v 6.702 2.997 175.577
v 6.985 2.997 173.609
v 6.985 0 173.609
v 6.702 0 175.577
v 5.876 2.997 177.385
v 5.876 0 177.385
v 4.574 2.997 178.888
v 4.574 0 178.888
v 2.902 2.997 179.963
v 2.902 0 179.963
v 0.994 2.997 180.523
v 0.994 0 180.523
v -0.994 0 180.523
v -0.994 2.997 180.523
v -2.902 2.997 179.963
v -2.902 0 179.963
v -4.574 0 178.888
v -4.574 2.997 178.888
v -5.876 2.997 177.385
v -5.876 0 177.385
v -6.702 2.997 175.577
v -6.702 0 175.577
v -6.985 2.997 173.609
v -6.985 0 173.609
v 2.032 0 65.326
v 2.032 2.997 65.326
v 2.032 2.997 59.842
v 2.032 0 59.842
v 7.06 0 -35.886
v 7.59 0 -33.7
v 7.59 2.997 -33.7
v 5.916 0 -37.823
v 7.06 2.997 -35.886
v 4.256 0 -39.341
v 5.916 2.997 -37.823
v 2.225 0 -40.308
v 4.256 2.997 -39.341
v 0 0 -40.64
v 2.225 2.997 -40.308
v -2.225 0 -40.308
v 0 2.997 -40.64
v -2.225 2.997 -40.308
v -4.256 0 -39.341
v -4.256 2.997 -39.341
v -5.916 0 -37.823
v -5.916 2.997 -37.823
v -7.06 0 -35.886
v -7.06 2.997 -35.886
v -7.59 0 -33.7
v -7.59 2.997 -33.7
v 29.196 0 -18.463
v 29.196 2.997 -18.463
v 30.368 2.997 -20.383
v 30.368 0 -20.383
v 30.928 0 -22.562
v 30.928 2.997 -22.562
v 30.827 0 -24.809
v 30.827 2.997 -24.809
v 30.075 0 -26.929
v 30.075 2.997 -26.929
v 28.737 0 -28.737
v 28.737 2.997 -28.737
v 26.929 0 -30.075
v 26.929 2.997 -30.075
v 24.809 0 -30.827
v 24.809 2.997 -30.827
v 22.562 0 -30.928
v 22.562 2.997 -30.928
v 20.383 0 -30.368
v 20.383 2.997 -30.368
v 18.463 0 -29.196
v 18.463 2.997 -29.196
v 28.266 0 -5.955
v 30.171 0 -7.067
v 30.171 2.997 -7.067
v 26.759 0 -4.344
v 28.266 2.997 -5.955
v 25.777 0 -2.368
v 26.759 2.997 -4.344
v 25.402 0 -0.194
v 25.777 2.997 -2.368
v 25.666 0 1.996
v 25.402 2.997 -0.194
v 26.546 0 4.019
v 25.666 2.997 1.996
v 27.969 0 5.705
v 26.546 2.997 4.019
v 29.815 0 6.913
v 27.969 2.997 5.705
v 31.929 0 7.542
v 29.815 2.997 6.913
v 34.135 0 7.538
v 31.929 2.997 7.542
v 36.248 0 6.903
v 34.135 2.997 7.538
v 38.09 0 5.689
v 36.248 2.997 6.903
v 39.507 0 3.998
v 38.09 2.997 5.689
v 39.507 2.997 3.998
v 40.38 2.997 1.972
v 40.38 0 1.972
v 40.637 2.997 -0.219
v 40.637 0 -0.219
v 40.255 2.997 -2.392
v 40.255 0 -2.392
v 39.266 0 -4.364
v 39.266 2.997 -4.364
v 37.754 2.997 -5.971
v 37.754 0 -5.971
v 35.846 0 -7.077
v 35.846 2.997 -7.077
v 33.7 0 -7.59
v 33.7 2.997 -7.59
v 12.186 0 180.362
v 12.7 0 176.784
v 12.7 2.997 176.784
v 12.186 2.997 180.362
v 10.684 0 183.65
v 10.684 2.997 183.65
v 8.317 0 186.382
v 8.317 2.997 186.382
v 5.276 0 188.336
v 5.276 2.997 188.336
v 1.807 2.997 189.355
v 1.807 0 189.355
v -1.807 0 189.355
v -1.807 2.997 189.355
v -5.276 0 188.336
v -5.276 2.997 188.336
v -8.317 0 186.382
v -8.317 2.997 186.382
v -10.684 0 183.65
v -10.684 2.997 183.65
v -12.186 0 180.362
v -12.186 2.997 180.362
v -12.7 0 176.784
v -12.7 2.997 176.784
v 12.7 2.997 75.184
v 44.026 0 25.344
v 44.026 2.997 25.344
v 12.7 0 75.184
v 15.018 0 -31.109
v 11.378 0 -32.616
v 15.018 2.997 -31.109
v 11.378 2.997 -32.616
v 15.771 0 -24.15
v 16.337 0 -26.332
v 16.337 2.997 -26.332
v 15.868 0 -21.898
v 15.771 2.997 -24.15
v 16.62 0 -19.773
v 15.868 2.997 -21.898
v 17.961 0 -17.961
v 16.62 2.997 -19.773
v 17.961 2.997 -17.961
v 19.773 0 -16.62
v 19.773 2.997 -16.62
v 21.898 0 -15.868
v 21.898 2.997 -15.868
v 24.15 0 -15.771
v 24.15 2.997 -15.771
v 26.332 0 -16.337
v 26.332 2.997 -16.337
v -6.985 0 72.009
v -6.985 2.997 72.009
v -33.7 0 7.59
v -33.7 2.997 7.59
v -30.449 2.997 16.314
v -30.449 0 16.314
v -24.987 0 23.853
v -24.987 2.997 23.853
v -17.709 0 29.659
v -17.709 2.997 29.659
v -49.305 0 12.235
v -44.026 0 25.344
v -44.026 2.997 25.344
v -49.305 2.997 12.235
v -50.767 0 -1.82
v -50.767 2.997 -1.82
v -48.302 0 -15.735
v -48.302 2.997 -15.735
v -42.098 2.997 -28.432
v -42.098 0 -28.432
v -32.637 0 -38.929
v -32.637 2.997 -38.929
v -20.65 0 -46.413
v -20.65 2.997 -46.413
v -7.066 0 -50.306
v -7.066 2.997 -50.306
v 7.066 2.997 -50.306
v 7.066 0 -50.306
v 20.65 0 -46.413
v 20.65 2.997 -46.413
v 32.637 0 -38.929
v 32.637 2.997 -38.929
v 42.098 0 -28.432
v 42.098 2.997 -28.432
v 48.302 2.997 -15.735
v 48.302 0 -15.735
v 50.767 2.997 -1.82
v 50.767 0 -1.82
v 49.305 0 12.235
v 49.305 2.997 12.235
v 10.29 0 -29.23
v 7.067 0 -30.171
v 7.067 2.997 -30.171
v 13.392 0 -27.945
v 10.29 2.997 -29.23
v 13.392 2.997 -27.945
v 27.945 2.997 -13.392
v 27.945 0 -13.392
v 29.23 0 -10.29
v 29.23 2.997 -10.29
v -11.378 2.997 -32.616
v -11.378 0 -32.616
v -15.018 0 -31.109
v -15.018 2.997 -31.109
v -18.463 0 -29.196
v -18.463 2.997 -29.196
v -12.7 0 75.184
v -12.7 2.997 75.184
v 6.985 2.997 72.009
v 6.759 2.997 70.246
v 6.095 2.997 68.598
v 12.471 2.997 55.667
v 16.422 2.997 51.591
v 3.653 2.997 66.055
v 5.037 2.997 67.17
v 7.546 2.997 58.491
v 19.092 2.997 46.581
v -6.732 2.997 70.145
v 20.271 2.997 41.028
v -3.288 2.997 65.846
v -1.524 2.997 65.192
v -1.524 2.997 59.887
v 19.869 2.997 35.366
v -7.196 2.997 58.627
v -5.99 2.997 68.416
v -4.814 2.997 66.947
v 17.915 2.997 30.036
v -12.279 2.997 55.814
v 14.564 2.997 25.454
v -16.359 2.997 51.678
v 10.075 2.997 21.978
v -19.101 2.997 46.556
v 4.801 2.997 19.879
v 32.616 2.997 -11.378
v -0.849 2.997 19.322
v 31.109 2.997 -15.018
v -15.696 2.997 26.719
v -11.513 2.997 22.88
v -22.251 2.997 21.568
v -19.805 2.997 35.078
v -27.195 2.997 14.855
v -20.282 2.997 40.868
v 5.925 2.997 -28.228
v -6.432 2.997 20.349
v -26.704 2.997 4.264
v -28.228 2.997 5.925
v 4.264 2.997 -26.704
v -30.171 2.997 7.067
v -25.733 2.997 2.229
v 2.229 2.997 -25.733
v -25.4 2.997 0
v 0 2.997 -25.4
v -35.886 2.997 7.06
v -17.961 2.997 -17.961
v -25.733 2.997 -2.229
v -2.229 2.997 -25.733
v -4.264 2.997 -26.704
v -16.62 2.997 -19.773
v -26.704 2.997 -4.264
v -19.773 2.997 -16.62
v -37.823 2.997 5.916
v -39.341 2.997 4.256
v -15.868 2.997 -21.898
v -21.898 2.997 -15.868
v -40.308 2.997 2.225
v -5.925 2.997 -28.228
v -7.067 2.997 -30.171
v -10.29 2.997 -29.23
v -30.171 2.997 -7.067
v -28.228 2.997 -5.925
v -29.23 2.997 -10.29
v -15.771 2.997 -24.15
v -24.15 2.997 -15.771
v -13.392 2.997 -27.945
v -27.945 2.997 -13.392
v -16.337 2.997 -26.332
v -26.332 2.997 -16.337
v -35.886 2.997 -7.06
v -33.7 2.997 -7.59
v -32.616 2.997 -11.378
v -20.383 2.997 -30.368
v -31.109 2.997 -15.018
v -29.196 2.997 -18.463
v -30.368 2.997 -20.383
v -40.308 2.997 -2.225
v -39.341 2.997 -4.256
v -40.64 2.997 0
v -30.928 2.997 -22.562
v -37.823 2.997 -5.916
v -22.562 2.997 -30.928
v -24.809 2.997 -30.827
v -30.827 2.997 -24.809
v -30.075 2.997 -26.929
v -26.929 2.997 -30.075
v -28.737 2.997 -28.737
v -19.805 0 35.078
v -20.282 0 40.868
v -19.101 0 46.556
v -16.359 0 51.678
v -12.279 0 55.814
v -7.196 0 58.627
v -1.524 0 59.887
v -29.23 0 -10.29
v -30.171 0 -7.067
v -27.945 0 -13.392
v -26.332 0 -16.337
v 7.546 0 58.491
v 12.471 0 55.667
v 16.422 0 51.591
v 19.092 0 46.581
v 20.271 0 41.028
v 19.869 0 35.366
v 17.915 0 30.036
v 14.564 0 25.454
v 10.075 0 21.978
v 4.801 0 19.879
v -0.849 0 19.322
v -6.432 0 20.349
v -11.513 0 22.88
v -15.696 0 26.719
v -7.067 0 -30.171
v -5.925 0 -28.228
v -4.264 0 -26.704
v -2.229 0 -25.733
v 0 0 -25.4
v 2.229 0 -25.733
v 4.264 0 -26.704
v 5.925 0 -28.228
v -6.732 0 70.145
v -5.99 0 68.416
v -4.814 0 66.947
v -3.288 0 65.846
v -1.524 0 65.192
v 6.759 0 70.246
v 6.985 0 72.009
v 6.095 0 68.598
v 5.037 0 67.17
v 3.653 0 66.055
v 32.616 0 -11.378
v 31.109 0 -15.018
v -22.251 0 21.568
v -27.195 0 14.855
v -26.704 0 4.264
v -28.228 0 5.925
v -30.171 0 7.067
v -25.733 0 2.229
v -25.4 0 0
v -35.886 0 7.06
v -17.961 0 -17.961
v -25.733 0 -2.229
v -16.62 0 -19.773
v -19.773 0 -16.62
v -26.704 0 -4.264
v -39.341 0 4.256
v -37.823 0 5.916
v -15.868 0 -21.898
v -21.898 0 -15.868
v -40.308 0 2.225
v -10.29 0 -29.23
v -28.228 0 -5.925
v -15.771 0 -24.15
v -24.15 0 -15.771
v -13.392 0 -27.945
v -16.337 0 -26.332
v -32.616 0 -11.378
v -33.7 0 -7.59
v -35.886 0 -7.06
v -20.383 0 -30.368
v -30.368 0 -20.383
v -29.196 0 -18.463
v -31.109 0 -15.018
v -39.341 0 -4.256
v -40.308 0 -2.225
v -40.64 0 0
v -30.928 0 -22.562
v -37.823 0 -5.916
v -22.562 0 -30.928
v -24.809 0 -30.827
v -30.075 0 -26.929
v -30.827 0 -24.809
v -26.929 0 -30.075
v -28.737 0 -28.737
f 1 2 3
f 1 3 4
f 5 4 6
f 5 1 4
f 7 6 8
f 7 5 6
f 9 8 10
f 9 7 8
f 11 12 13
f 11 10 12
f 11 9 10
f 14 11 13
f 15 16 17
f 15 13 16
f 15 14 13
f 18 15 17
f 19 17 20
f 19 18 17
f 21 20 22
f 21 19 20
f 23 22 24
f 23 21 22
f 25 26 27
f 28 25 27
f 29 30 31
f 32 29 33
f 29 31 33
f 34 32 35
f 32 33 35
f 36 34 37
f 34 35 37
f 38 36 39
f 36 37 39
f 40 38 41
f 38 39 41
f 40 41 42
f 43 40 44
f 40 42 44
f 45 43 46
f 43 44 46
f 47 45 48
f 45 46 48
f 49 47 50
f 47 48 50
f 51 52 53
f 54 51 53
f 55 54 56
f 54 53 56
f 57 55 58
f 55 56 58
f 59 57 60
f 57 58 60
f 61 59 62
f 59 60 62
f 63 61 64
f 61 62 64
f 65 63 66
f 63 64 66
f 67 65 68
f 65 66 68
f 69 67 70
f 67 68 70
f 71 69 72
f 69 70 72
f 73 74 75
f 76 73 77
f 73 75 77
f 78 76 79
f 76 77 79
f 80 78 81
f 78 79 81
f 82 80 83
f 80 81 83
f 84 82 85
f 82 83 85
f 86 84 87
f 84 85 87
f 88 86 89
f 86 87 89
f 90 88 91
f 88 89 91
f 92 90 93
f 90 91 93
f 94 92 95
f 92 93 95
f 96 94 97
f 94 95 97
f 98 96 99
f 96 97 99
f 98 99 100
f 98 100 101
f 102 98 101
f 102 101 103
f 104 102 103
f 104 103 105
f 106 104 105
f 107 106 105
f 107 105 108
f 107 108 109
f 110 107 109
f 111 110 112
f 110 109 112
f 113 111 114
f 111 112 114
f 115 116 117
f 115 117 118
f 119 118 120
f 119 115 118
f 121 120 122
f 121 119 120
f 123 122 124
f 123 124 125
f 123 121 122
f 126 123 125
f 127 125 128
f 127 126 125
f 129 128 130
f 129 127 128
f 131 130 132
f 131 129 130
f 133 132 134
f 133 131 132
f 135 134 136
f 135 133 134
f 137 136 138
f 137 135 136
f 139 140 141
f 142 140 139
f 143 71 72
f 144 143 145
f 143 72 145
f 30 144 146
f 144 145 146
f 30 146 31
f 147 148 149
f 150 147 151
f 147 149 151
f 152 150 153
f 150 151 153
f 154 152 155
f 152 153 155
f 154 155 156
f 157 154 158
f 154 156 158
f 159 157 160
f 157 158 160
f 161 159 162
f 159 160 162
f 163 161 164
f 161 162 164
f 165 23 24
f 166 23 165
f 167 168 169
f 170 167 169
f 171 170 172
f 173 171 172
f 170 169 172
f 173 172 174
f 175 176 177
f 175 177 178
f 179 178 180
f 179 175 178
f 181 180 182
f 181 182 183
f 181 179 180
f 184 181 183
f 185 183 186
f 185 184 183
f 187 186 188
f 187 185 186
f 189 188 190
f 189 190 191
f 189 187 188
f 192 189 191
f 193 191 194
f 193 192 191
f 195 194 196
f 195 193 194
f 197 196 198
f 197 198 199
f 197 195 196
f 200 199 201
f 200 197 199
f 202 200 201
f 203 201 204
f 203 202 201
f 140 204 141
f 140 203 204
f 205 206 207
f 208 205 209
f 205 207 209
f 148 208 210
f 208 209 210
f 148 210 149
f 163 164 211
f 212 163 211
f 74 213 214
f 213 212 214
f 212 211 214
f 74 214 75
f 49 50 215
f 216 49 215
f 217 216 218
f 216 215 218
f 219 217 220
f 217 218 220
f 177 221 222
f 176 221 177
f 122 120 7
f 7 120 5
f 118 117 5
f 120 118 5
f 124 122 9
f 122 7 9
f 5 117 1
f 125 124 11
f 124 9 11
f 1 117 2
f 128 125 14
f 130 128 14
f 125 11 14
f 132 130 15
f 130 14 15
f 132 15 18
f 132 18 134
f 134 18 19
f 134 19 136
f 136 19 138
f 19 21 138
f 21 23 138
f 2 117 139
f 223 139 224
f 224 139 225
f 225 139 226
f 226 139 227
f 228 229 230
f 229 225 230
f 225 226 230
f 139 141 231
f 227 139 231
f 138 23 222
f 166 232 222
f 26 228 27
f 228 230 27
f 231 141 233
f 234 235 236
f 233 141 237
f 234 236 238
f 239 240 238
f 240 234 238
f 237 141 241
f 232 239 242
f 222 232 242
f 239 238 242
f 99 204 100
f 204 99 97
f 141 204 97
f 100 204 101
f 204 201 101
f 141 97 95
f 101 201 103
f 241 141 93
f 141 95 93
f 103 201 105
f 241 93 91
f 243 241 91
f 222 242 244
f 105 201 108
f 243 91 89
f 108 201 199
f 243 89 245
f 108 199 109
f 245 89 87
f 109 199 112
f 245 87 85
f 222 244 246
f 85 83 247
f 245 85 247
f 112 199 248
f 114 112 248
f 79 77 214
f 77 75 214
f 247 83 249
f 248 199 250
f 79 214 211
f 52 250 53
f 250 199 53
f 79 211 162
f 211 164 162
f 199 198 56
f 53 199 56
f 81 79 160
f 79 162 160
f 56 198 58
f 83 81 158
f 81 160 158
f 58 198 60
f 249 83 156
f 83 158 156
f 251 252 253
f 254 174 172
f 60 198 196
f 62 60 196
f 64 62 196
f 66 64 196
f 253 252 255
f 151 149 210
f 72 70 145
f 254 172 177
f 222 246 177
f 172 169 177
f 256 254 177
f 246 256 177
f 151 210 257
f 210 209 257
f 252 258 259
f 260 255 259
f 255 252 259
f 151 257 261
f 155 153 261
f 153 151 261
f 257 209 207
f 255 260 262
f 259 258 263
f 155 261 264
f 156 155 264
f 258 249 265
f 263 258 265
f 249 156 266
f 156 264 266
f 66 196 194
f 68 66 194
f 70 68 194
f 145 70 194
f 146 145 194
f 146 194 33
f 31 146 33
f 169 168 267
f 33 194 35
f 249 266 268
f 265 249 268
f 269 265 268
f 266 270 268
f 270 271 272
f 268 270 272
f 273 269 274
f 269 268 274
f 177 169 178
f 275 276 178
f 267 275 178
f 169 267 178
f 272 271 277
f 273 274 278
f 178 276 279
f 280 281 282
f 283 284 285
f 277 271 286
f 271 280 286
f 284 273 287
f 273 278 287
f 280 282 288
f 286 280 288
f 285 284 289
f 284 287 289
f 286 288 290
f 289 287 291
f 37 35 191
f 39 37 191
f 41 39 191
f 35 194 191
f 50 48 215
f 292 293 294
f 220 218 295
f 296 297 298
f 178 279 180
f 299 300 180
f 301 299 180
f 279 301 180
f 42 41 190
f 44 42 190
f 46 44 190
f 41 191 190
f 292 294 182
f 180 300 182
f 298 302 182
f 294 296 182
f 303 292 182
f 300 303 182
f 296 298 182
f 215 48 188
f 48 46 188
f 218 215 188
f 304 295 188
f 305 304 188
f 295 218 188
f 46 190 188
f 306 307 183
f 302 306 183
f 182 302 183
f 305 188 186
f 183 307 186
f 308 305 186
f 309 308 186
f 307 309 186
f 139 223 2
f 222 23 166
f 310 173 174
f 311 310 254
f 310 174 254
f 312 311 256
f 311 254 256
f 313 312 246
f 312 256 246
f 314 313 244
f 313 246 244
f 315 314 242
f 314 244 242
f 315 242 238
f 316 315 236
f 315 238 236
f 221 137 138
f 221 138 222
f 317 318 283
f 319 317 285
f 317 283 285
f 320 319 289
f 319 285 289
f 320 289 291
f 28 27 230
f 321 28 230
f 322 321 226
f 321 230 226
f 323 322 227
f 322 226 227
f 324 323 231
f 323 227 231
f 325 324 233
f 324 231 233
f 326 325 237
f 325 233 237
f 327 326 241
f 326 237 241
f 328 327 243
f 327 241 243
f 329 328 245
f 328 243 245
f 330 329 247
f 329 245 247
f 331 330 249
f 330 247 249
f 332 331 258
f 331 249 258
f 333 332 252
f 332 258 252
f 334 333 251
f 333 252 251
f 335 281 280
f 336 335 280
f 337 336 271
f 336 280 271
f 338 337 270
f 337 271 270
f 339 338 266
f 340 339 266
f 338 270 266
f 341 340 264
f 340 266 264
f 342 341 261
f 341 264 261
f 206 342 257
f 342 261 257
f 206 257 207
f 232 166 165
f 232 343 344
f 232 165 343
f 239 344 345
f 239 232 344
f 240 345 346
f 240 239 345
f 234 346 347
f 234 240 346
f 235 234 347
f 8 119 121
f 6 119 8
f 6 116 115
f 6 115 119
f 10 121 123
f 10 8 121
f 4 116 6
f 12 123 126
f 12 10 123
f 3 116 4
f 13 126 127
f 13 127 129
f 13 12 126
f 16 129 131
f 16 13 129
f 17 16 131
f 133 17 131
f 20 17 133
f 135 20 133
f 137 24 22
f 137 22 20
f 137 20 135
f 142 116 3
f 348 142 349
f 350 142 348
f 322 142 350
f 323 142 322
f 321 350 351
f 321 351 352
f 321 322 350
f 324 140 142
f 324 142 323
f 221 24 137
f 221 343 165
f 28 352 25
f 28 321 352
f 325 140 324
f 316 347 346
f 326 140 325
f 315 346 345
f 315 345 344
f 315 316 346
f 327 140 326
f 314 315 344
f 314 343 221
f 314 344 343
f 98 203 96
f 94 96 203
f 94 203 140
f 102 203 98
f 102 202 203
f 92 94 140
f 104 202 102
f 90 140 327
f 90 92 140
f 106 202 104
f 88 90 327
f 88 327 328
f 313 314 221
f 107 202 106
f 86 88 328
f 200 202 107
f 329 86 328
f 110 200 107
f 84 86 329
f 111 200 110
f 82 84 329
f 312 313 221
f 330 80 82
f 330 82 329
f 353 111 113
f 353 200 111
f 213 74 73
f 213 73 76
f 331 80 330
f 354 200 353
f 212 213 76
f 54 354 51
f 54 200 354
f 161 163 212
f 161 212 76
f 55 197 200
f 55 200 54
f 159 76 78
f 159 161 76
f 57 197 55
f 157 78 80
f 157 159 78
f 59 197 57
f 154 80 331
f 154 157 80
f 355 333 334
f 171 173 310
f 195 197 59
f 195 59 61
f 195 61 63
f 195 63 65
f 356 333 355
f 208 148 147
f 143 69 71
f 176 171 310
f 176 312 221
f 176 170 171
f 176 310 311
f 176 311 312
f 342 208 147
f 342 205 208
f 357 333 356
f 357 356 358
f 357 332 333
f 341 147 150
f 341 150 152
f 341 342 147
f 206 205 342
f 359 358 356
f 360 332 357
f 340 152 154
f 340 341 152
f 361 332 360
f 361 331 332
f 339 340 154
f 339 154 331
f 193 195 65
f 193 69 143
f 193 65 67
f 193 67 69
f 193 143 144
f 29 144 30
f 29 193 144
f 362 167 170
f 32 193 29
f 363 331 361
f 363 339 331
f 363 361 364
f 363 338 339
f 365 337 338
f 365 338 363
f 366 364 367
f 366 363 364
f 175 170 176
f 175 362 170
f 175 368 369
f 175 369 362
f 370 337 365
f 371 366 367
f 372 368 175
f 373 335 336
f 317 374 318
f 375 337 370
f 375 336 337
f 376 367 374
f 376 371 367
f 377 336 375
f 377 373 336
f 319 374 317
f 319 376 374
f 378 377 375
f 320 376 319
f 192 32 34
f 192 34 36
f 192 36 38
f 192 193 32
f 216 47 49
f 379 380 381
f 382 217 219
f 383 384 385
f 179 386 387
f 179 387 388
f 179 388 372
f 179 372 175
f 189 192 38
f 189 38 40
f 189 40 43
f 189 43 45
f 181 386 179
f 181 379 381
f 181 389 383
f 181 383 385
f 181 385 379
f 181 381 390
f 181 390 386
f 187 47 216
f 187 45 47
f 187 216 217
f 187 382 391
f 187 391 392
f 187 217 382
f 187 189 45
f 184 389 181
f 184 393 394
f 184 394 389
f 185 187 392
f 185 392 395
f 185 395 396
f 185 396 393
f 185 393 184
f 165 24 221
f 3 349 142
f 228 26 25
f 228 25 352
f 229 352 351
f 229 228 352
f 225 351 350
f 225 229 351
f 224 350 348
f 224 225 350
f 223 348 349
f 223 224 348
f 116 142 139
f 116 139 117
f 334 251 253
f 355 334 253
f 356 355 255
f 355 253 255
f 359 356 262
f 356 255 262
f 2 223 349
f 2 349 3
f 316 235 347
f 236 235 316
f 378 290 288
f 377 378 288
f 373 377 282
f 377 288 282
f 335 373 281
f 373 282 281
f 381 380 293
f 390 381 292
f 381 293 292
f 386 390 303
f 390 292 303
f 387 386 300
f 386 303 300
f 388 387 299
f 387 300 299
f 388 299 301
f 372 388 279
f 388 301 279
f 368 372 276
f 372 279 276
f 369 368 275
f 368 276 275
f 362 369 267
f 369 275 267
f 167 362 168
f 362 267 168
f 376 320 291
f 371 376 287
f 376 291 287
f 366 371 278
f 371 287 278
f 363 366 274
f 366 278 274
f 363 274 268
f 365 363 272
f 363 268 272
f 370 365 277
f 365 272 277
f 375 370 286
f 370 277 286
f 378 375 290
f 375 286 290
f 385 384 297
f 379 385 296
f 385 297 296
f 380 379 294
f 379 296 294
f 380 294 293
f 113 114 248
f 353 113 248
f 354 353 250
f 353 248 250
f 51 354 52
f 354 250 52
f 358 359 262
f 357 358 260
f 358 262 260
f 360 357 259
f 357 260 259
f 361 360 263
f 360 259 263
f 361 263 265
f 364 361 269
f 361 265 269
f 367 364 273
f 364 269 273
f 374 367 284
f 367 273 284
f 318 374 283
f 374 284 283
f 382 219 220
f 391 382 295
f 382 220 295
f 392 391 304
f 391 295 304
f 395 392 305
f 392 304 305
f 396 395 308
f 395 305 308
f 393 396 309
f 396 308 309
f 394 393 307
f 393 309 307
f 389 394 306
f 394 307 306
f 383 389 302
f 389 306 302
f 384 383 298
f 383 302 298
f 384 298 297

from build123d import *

# Parameters (mm, degrees)
BOSS_EXTRUDE1_DEPTH = 2.9972
SKETCH2_R           = 7.62
CUT_EXTRUDE1_DEPTH  = 197.198393122
CUT_EXTRUDE2_DEPTH  = 197.198393122
SKETCH4_R           = 20.32
CUT_EXTRUDE3_DEPTH  = 197.198393122
CUT_EXTRUDE4_DEPTH  = 197.198393122
SKETCH6_W           = 3.556
SKETCH6_H           = 9.751681081
CUT_EXTRUDE5_DEPTH  = 197.198393122


with BuildPart() as part:
    # Sketch1 → Boss-Extrude1 (new body)
    with BuildSketch(Plane(origin=(0, 0, 0), x_dir=(1, 0, 0), z_dir=(0, 1, 0))):
        with BuildLine():
            Line((12.7, -75.184), (12.7, -176.784))
            ThreePointArc((12.7, -176.784), (0, -189.484), (-12.7, -176.784))
            Line((-12.7, -176.784), (-12.7, -75.184))
            Line((-12.7, -75.184), (-44.026400327, -25.343955378))
            ThreePointArc((-44.026400327, -25.343955378), (0, 50.8), (44.026400327, -25.343955378))
            Line((44.026400327, -25.343955378), (12.7, -75.184))
        make_face()
    extrude(amount=BOSS_EXTRUDE1_DEPTH)

    # Sketch2 → Cut-Extrude1 (cut, through all)
    with BuildSketch(Plane(origin=(0, 2.9972, 0), x_dir=(1, 0, 0), z_dir=(0, 1, 0))):
        with Locations(Location((-33.02, 0, 0), (0, 0, 270))):
            Circle(SKETCH2_R)
        with Locations(Location((-23.348665915, 23.348665915, 0), (0, 0, 270))):
            Circle(SKETCH2_R)
        with Locations(Location((0, 33.02, 0), (0, 0, 270))):
            Circle(SKETCH2_R)
        with Locations(Location((23.348665915, 23.348665915, 0), (0, 0, 270))):
            Circle(SKETCH2_R)
        with Locations(Location((33.02, 0, 0), (0, 0, 270))):
            Circle(SKETCH2_R)
    extrude(amount=-CUT_EXTRUDE1_DEPTH, mode=Mode.SUBTRACT)

    # Sketch3 → Cut-Extrude2 (cut, through all)
    with BuildSketch(Plane(origin=(0, 2.9972, 0), x_dir=(1, 0, 0), z_dir=(0, 1, 0))):
        with BuildLine():
            Line((-15.316948027, -30.962542518), (-1.255828352, -30.962542518))
            ThreePointArc((-1.255828352, -30.962542518), (-21.463230594, 22.351417773), (30.988, 0))
            Line((30.988, 0), (34.544, 0))
            ThreePointArc((34.544, 0), (-18.223326856, 29.346180234), (-15.316948027, -30.962542518))
        make_face()
    extrude(amount=-CUT_EXTRUDE2_DEPTH, mode=Mode.SUBTRACT)

    # Sketch4 → Cut-Extrude3 (cut, through all)
    with BuildSketch(Plane(origin=(0, 2.9972, 0), x_dir=(1, 0, 0), z_dir=(0, 1, 0))):
        with Locations((0, -39.624)):
            Circle(SKETCH4_R)
    extrude(amount=-CUT_EXTRUDE3_DEPTH, mode=Mode.SUBTRACT)

    # Sketch5 → Cut-Extrude4 (cut, through all)
    with BuildSketch(Plane(origin=(0, 2.9972, 0), x_dir=(1, 0, 0), z_dir=(0, 1, 0))):
        with BuildLine():
            Line((6.985, -72.009), (6.985, -173.609))
            ThreePointArc((6.985, -173.609), (0, -180.594), (-6.985, -173.609))
            Line((-6.985, -173.609), (-6.985, -72.009))
            ThreePointArc((-6.985, -72.009), (0, -65.024), (6.985, -72.009))
        make_face()
    extrude(amount=-CUT_EXTRUDE4_DEPTH, mode=Mode.SUBTRACT)

    # Sketch6 → Cut-Extrude5 (cut, through all)
    with BuildSketch(Plane(origin=(0, 2.9972, 0), x_dir=(1, 0, 0), z_dir=(0, 1, 0))):
        with Locations((0.254, -62.435855584)):
            Rectangle(SKETCH6_W, SKETCH6_H)
    extrude(amount=-CUT_EXTRUDE5_DEPTH, mode=Mode.SUBTRACT)


solid = part.part
